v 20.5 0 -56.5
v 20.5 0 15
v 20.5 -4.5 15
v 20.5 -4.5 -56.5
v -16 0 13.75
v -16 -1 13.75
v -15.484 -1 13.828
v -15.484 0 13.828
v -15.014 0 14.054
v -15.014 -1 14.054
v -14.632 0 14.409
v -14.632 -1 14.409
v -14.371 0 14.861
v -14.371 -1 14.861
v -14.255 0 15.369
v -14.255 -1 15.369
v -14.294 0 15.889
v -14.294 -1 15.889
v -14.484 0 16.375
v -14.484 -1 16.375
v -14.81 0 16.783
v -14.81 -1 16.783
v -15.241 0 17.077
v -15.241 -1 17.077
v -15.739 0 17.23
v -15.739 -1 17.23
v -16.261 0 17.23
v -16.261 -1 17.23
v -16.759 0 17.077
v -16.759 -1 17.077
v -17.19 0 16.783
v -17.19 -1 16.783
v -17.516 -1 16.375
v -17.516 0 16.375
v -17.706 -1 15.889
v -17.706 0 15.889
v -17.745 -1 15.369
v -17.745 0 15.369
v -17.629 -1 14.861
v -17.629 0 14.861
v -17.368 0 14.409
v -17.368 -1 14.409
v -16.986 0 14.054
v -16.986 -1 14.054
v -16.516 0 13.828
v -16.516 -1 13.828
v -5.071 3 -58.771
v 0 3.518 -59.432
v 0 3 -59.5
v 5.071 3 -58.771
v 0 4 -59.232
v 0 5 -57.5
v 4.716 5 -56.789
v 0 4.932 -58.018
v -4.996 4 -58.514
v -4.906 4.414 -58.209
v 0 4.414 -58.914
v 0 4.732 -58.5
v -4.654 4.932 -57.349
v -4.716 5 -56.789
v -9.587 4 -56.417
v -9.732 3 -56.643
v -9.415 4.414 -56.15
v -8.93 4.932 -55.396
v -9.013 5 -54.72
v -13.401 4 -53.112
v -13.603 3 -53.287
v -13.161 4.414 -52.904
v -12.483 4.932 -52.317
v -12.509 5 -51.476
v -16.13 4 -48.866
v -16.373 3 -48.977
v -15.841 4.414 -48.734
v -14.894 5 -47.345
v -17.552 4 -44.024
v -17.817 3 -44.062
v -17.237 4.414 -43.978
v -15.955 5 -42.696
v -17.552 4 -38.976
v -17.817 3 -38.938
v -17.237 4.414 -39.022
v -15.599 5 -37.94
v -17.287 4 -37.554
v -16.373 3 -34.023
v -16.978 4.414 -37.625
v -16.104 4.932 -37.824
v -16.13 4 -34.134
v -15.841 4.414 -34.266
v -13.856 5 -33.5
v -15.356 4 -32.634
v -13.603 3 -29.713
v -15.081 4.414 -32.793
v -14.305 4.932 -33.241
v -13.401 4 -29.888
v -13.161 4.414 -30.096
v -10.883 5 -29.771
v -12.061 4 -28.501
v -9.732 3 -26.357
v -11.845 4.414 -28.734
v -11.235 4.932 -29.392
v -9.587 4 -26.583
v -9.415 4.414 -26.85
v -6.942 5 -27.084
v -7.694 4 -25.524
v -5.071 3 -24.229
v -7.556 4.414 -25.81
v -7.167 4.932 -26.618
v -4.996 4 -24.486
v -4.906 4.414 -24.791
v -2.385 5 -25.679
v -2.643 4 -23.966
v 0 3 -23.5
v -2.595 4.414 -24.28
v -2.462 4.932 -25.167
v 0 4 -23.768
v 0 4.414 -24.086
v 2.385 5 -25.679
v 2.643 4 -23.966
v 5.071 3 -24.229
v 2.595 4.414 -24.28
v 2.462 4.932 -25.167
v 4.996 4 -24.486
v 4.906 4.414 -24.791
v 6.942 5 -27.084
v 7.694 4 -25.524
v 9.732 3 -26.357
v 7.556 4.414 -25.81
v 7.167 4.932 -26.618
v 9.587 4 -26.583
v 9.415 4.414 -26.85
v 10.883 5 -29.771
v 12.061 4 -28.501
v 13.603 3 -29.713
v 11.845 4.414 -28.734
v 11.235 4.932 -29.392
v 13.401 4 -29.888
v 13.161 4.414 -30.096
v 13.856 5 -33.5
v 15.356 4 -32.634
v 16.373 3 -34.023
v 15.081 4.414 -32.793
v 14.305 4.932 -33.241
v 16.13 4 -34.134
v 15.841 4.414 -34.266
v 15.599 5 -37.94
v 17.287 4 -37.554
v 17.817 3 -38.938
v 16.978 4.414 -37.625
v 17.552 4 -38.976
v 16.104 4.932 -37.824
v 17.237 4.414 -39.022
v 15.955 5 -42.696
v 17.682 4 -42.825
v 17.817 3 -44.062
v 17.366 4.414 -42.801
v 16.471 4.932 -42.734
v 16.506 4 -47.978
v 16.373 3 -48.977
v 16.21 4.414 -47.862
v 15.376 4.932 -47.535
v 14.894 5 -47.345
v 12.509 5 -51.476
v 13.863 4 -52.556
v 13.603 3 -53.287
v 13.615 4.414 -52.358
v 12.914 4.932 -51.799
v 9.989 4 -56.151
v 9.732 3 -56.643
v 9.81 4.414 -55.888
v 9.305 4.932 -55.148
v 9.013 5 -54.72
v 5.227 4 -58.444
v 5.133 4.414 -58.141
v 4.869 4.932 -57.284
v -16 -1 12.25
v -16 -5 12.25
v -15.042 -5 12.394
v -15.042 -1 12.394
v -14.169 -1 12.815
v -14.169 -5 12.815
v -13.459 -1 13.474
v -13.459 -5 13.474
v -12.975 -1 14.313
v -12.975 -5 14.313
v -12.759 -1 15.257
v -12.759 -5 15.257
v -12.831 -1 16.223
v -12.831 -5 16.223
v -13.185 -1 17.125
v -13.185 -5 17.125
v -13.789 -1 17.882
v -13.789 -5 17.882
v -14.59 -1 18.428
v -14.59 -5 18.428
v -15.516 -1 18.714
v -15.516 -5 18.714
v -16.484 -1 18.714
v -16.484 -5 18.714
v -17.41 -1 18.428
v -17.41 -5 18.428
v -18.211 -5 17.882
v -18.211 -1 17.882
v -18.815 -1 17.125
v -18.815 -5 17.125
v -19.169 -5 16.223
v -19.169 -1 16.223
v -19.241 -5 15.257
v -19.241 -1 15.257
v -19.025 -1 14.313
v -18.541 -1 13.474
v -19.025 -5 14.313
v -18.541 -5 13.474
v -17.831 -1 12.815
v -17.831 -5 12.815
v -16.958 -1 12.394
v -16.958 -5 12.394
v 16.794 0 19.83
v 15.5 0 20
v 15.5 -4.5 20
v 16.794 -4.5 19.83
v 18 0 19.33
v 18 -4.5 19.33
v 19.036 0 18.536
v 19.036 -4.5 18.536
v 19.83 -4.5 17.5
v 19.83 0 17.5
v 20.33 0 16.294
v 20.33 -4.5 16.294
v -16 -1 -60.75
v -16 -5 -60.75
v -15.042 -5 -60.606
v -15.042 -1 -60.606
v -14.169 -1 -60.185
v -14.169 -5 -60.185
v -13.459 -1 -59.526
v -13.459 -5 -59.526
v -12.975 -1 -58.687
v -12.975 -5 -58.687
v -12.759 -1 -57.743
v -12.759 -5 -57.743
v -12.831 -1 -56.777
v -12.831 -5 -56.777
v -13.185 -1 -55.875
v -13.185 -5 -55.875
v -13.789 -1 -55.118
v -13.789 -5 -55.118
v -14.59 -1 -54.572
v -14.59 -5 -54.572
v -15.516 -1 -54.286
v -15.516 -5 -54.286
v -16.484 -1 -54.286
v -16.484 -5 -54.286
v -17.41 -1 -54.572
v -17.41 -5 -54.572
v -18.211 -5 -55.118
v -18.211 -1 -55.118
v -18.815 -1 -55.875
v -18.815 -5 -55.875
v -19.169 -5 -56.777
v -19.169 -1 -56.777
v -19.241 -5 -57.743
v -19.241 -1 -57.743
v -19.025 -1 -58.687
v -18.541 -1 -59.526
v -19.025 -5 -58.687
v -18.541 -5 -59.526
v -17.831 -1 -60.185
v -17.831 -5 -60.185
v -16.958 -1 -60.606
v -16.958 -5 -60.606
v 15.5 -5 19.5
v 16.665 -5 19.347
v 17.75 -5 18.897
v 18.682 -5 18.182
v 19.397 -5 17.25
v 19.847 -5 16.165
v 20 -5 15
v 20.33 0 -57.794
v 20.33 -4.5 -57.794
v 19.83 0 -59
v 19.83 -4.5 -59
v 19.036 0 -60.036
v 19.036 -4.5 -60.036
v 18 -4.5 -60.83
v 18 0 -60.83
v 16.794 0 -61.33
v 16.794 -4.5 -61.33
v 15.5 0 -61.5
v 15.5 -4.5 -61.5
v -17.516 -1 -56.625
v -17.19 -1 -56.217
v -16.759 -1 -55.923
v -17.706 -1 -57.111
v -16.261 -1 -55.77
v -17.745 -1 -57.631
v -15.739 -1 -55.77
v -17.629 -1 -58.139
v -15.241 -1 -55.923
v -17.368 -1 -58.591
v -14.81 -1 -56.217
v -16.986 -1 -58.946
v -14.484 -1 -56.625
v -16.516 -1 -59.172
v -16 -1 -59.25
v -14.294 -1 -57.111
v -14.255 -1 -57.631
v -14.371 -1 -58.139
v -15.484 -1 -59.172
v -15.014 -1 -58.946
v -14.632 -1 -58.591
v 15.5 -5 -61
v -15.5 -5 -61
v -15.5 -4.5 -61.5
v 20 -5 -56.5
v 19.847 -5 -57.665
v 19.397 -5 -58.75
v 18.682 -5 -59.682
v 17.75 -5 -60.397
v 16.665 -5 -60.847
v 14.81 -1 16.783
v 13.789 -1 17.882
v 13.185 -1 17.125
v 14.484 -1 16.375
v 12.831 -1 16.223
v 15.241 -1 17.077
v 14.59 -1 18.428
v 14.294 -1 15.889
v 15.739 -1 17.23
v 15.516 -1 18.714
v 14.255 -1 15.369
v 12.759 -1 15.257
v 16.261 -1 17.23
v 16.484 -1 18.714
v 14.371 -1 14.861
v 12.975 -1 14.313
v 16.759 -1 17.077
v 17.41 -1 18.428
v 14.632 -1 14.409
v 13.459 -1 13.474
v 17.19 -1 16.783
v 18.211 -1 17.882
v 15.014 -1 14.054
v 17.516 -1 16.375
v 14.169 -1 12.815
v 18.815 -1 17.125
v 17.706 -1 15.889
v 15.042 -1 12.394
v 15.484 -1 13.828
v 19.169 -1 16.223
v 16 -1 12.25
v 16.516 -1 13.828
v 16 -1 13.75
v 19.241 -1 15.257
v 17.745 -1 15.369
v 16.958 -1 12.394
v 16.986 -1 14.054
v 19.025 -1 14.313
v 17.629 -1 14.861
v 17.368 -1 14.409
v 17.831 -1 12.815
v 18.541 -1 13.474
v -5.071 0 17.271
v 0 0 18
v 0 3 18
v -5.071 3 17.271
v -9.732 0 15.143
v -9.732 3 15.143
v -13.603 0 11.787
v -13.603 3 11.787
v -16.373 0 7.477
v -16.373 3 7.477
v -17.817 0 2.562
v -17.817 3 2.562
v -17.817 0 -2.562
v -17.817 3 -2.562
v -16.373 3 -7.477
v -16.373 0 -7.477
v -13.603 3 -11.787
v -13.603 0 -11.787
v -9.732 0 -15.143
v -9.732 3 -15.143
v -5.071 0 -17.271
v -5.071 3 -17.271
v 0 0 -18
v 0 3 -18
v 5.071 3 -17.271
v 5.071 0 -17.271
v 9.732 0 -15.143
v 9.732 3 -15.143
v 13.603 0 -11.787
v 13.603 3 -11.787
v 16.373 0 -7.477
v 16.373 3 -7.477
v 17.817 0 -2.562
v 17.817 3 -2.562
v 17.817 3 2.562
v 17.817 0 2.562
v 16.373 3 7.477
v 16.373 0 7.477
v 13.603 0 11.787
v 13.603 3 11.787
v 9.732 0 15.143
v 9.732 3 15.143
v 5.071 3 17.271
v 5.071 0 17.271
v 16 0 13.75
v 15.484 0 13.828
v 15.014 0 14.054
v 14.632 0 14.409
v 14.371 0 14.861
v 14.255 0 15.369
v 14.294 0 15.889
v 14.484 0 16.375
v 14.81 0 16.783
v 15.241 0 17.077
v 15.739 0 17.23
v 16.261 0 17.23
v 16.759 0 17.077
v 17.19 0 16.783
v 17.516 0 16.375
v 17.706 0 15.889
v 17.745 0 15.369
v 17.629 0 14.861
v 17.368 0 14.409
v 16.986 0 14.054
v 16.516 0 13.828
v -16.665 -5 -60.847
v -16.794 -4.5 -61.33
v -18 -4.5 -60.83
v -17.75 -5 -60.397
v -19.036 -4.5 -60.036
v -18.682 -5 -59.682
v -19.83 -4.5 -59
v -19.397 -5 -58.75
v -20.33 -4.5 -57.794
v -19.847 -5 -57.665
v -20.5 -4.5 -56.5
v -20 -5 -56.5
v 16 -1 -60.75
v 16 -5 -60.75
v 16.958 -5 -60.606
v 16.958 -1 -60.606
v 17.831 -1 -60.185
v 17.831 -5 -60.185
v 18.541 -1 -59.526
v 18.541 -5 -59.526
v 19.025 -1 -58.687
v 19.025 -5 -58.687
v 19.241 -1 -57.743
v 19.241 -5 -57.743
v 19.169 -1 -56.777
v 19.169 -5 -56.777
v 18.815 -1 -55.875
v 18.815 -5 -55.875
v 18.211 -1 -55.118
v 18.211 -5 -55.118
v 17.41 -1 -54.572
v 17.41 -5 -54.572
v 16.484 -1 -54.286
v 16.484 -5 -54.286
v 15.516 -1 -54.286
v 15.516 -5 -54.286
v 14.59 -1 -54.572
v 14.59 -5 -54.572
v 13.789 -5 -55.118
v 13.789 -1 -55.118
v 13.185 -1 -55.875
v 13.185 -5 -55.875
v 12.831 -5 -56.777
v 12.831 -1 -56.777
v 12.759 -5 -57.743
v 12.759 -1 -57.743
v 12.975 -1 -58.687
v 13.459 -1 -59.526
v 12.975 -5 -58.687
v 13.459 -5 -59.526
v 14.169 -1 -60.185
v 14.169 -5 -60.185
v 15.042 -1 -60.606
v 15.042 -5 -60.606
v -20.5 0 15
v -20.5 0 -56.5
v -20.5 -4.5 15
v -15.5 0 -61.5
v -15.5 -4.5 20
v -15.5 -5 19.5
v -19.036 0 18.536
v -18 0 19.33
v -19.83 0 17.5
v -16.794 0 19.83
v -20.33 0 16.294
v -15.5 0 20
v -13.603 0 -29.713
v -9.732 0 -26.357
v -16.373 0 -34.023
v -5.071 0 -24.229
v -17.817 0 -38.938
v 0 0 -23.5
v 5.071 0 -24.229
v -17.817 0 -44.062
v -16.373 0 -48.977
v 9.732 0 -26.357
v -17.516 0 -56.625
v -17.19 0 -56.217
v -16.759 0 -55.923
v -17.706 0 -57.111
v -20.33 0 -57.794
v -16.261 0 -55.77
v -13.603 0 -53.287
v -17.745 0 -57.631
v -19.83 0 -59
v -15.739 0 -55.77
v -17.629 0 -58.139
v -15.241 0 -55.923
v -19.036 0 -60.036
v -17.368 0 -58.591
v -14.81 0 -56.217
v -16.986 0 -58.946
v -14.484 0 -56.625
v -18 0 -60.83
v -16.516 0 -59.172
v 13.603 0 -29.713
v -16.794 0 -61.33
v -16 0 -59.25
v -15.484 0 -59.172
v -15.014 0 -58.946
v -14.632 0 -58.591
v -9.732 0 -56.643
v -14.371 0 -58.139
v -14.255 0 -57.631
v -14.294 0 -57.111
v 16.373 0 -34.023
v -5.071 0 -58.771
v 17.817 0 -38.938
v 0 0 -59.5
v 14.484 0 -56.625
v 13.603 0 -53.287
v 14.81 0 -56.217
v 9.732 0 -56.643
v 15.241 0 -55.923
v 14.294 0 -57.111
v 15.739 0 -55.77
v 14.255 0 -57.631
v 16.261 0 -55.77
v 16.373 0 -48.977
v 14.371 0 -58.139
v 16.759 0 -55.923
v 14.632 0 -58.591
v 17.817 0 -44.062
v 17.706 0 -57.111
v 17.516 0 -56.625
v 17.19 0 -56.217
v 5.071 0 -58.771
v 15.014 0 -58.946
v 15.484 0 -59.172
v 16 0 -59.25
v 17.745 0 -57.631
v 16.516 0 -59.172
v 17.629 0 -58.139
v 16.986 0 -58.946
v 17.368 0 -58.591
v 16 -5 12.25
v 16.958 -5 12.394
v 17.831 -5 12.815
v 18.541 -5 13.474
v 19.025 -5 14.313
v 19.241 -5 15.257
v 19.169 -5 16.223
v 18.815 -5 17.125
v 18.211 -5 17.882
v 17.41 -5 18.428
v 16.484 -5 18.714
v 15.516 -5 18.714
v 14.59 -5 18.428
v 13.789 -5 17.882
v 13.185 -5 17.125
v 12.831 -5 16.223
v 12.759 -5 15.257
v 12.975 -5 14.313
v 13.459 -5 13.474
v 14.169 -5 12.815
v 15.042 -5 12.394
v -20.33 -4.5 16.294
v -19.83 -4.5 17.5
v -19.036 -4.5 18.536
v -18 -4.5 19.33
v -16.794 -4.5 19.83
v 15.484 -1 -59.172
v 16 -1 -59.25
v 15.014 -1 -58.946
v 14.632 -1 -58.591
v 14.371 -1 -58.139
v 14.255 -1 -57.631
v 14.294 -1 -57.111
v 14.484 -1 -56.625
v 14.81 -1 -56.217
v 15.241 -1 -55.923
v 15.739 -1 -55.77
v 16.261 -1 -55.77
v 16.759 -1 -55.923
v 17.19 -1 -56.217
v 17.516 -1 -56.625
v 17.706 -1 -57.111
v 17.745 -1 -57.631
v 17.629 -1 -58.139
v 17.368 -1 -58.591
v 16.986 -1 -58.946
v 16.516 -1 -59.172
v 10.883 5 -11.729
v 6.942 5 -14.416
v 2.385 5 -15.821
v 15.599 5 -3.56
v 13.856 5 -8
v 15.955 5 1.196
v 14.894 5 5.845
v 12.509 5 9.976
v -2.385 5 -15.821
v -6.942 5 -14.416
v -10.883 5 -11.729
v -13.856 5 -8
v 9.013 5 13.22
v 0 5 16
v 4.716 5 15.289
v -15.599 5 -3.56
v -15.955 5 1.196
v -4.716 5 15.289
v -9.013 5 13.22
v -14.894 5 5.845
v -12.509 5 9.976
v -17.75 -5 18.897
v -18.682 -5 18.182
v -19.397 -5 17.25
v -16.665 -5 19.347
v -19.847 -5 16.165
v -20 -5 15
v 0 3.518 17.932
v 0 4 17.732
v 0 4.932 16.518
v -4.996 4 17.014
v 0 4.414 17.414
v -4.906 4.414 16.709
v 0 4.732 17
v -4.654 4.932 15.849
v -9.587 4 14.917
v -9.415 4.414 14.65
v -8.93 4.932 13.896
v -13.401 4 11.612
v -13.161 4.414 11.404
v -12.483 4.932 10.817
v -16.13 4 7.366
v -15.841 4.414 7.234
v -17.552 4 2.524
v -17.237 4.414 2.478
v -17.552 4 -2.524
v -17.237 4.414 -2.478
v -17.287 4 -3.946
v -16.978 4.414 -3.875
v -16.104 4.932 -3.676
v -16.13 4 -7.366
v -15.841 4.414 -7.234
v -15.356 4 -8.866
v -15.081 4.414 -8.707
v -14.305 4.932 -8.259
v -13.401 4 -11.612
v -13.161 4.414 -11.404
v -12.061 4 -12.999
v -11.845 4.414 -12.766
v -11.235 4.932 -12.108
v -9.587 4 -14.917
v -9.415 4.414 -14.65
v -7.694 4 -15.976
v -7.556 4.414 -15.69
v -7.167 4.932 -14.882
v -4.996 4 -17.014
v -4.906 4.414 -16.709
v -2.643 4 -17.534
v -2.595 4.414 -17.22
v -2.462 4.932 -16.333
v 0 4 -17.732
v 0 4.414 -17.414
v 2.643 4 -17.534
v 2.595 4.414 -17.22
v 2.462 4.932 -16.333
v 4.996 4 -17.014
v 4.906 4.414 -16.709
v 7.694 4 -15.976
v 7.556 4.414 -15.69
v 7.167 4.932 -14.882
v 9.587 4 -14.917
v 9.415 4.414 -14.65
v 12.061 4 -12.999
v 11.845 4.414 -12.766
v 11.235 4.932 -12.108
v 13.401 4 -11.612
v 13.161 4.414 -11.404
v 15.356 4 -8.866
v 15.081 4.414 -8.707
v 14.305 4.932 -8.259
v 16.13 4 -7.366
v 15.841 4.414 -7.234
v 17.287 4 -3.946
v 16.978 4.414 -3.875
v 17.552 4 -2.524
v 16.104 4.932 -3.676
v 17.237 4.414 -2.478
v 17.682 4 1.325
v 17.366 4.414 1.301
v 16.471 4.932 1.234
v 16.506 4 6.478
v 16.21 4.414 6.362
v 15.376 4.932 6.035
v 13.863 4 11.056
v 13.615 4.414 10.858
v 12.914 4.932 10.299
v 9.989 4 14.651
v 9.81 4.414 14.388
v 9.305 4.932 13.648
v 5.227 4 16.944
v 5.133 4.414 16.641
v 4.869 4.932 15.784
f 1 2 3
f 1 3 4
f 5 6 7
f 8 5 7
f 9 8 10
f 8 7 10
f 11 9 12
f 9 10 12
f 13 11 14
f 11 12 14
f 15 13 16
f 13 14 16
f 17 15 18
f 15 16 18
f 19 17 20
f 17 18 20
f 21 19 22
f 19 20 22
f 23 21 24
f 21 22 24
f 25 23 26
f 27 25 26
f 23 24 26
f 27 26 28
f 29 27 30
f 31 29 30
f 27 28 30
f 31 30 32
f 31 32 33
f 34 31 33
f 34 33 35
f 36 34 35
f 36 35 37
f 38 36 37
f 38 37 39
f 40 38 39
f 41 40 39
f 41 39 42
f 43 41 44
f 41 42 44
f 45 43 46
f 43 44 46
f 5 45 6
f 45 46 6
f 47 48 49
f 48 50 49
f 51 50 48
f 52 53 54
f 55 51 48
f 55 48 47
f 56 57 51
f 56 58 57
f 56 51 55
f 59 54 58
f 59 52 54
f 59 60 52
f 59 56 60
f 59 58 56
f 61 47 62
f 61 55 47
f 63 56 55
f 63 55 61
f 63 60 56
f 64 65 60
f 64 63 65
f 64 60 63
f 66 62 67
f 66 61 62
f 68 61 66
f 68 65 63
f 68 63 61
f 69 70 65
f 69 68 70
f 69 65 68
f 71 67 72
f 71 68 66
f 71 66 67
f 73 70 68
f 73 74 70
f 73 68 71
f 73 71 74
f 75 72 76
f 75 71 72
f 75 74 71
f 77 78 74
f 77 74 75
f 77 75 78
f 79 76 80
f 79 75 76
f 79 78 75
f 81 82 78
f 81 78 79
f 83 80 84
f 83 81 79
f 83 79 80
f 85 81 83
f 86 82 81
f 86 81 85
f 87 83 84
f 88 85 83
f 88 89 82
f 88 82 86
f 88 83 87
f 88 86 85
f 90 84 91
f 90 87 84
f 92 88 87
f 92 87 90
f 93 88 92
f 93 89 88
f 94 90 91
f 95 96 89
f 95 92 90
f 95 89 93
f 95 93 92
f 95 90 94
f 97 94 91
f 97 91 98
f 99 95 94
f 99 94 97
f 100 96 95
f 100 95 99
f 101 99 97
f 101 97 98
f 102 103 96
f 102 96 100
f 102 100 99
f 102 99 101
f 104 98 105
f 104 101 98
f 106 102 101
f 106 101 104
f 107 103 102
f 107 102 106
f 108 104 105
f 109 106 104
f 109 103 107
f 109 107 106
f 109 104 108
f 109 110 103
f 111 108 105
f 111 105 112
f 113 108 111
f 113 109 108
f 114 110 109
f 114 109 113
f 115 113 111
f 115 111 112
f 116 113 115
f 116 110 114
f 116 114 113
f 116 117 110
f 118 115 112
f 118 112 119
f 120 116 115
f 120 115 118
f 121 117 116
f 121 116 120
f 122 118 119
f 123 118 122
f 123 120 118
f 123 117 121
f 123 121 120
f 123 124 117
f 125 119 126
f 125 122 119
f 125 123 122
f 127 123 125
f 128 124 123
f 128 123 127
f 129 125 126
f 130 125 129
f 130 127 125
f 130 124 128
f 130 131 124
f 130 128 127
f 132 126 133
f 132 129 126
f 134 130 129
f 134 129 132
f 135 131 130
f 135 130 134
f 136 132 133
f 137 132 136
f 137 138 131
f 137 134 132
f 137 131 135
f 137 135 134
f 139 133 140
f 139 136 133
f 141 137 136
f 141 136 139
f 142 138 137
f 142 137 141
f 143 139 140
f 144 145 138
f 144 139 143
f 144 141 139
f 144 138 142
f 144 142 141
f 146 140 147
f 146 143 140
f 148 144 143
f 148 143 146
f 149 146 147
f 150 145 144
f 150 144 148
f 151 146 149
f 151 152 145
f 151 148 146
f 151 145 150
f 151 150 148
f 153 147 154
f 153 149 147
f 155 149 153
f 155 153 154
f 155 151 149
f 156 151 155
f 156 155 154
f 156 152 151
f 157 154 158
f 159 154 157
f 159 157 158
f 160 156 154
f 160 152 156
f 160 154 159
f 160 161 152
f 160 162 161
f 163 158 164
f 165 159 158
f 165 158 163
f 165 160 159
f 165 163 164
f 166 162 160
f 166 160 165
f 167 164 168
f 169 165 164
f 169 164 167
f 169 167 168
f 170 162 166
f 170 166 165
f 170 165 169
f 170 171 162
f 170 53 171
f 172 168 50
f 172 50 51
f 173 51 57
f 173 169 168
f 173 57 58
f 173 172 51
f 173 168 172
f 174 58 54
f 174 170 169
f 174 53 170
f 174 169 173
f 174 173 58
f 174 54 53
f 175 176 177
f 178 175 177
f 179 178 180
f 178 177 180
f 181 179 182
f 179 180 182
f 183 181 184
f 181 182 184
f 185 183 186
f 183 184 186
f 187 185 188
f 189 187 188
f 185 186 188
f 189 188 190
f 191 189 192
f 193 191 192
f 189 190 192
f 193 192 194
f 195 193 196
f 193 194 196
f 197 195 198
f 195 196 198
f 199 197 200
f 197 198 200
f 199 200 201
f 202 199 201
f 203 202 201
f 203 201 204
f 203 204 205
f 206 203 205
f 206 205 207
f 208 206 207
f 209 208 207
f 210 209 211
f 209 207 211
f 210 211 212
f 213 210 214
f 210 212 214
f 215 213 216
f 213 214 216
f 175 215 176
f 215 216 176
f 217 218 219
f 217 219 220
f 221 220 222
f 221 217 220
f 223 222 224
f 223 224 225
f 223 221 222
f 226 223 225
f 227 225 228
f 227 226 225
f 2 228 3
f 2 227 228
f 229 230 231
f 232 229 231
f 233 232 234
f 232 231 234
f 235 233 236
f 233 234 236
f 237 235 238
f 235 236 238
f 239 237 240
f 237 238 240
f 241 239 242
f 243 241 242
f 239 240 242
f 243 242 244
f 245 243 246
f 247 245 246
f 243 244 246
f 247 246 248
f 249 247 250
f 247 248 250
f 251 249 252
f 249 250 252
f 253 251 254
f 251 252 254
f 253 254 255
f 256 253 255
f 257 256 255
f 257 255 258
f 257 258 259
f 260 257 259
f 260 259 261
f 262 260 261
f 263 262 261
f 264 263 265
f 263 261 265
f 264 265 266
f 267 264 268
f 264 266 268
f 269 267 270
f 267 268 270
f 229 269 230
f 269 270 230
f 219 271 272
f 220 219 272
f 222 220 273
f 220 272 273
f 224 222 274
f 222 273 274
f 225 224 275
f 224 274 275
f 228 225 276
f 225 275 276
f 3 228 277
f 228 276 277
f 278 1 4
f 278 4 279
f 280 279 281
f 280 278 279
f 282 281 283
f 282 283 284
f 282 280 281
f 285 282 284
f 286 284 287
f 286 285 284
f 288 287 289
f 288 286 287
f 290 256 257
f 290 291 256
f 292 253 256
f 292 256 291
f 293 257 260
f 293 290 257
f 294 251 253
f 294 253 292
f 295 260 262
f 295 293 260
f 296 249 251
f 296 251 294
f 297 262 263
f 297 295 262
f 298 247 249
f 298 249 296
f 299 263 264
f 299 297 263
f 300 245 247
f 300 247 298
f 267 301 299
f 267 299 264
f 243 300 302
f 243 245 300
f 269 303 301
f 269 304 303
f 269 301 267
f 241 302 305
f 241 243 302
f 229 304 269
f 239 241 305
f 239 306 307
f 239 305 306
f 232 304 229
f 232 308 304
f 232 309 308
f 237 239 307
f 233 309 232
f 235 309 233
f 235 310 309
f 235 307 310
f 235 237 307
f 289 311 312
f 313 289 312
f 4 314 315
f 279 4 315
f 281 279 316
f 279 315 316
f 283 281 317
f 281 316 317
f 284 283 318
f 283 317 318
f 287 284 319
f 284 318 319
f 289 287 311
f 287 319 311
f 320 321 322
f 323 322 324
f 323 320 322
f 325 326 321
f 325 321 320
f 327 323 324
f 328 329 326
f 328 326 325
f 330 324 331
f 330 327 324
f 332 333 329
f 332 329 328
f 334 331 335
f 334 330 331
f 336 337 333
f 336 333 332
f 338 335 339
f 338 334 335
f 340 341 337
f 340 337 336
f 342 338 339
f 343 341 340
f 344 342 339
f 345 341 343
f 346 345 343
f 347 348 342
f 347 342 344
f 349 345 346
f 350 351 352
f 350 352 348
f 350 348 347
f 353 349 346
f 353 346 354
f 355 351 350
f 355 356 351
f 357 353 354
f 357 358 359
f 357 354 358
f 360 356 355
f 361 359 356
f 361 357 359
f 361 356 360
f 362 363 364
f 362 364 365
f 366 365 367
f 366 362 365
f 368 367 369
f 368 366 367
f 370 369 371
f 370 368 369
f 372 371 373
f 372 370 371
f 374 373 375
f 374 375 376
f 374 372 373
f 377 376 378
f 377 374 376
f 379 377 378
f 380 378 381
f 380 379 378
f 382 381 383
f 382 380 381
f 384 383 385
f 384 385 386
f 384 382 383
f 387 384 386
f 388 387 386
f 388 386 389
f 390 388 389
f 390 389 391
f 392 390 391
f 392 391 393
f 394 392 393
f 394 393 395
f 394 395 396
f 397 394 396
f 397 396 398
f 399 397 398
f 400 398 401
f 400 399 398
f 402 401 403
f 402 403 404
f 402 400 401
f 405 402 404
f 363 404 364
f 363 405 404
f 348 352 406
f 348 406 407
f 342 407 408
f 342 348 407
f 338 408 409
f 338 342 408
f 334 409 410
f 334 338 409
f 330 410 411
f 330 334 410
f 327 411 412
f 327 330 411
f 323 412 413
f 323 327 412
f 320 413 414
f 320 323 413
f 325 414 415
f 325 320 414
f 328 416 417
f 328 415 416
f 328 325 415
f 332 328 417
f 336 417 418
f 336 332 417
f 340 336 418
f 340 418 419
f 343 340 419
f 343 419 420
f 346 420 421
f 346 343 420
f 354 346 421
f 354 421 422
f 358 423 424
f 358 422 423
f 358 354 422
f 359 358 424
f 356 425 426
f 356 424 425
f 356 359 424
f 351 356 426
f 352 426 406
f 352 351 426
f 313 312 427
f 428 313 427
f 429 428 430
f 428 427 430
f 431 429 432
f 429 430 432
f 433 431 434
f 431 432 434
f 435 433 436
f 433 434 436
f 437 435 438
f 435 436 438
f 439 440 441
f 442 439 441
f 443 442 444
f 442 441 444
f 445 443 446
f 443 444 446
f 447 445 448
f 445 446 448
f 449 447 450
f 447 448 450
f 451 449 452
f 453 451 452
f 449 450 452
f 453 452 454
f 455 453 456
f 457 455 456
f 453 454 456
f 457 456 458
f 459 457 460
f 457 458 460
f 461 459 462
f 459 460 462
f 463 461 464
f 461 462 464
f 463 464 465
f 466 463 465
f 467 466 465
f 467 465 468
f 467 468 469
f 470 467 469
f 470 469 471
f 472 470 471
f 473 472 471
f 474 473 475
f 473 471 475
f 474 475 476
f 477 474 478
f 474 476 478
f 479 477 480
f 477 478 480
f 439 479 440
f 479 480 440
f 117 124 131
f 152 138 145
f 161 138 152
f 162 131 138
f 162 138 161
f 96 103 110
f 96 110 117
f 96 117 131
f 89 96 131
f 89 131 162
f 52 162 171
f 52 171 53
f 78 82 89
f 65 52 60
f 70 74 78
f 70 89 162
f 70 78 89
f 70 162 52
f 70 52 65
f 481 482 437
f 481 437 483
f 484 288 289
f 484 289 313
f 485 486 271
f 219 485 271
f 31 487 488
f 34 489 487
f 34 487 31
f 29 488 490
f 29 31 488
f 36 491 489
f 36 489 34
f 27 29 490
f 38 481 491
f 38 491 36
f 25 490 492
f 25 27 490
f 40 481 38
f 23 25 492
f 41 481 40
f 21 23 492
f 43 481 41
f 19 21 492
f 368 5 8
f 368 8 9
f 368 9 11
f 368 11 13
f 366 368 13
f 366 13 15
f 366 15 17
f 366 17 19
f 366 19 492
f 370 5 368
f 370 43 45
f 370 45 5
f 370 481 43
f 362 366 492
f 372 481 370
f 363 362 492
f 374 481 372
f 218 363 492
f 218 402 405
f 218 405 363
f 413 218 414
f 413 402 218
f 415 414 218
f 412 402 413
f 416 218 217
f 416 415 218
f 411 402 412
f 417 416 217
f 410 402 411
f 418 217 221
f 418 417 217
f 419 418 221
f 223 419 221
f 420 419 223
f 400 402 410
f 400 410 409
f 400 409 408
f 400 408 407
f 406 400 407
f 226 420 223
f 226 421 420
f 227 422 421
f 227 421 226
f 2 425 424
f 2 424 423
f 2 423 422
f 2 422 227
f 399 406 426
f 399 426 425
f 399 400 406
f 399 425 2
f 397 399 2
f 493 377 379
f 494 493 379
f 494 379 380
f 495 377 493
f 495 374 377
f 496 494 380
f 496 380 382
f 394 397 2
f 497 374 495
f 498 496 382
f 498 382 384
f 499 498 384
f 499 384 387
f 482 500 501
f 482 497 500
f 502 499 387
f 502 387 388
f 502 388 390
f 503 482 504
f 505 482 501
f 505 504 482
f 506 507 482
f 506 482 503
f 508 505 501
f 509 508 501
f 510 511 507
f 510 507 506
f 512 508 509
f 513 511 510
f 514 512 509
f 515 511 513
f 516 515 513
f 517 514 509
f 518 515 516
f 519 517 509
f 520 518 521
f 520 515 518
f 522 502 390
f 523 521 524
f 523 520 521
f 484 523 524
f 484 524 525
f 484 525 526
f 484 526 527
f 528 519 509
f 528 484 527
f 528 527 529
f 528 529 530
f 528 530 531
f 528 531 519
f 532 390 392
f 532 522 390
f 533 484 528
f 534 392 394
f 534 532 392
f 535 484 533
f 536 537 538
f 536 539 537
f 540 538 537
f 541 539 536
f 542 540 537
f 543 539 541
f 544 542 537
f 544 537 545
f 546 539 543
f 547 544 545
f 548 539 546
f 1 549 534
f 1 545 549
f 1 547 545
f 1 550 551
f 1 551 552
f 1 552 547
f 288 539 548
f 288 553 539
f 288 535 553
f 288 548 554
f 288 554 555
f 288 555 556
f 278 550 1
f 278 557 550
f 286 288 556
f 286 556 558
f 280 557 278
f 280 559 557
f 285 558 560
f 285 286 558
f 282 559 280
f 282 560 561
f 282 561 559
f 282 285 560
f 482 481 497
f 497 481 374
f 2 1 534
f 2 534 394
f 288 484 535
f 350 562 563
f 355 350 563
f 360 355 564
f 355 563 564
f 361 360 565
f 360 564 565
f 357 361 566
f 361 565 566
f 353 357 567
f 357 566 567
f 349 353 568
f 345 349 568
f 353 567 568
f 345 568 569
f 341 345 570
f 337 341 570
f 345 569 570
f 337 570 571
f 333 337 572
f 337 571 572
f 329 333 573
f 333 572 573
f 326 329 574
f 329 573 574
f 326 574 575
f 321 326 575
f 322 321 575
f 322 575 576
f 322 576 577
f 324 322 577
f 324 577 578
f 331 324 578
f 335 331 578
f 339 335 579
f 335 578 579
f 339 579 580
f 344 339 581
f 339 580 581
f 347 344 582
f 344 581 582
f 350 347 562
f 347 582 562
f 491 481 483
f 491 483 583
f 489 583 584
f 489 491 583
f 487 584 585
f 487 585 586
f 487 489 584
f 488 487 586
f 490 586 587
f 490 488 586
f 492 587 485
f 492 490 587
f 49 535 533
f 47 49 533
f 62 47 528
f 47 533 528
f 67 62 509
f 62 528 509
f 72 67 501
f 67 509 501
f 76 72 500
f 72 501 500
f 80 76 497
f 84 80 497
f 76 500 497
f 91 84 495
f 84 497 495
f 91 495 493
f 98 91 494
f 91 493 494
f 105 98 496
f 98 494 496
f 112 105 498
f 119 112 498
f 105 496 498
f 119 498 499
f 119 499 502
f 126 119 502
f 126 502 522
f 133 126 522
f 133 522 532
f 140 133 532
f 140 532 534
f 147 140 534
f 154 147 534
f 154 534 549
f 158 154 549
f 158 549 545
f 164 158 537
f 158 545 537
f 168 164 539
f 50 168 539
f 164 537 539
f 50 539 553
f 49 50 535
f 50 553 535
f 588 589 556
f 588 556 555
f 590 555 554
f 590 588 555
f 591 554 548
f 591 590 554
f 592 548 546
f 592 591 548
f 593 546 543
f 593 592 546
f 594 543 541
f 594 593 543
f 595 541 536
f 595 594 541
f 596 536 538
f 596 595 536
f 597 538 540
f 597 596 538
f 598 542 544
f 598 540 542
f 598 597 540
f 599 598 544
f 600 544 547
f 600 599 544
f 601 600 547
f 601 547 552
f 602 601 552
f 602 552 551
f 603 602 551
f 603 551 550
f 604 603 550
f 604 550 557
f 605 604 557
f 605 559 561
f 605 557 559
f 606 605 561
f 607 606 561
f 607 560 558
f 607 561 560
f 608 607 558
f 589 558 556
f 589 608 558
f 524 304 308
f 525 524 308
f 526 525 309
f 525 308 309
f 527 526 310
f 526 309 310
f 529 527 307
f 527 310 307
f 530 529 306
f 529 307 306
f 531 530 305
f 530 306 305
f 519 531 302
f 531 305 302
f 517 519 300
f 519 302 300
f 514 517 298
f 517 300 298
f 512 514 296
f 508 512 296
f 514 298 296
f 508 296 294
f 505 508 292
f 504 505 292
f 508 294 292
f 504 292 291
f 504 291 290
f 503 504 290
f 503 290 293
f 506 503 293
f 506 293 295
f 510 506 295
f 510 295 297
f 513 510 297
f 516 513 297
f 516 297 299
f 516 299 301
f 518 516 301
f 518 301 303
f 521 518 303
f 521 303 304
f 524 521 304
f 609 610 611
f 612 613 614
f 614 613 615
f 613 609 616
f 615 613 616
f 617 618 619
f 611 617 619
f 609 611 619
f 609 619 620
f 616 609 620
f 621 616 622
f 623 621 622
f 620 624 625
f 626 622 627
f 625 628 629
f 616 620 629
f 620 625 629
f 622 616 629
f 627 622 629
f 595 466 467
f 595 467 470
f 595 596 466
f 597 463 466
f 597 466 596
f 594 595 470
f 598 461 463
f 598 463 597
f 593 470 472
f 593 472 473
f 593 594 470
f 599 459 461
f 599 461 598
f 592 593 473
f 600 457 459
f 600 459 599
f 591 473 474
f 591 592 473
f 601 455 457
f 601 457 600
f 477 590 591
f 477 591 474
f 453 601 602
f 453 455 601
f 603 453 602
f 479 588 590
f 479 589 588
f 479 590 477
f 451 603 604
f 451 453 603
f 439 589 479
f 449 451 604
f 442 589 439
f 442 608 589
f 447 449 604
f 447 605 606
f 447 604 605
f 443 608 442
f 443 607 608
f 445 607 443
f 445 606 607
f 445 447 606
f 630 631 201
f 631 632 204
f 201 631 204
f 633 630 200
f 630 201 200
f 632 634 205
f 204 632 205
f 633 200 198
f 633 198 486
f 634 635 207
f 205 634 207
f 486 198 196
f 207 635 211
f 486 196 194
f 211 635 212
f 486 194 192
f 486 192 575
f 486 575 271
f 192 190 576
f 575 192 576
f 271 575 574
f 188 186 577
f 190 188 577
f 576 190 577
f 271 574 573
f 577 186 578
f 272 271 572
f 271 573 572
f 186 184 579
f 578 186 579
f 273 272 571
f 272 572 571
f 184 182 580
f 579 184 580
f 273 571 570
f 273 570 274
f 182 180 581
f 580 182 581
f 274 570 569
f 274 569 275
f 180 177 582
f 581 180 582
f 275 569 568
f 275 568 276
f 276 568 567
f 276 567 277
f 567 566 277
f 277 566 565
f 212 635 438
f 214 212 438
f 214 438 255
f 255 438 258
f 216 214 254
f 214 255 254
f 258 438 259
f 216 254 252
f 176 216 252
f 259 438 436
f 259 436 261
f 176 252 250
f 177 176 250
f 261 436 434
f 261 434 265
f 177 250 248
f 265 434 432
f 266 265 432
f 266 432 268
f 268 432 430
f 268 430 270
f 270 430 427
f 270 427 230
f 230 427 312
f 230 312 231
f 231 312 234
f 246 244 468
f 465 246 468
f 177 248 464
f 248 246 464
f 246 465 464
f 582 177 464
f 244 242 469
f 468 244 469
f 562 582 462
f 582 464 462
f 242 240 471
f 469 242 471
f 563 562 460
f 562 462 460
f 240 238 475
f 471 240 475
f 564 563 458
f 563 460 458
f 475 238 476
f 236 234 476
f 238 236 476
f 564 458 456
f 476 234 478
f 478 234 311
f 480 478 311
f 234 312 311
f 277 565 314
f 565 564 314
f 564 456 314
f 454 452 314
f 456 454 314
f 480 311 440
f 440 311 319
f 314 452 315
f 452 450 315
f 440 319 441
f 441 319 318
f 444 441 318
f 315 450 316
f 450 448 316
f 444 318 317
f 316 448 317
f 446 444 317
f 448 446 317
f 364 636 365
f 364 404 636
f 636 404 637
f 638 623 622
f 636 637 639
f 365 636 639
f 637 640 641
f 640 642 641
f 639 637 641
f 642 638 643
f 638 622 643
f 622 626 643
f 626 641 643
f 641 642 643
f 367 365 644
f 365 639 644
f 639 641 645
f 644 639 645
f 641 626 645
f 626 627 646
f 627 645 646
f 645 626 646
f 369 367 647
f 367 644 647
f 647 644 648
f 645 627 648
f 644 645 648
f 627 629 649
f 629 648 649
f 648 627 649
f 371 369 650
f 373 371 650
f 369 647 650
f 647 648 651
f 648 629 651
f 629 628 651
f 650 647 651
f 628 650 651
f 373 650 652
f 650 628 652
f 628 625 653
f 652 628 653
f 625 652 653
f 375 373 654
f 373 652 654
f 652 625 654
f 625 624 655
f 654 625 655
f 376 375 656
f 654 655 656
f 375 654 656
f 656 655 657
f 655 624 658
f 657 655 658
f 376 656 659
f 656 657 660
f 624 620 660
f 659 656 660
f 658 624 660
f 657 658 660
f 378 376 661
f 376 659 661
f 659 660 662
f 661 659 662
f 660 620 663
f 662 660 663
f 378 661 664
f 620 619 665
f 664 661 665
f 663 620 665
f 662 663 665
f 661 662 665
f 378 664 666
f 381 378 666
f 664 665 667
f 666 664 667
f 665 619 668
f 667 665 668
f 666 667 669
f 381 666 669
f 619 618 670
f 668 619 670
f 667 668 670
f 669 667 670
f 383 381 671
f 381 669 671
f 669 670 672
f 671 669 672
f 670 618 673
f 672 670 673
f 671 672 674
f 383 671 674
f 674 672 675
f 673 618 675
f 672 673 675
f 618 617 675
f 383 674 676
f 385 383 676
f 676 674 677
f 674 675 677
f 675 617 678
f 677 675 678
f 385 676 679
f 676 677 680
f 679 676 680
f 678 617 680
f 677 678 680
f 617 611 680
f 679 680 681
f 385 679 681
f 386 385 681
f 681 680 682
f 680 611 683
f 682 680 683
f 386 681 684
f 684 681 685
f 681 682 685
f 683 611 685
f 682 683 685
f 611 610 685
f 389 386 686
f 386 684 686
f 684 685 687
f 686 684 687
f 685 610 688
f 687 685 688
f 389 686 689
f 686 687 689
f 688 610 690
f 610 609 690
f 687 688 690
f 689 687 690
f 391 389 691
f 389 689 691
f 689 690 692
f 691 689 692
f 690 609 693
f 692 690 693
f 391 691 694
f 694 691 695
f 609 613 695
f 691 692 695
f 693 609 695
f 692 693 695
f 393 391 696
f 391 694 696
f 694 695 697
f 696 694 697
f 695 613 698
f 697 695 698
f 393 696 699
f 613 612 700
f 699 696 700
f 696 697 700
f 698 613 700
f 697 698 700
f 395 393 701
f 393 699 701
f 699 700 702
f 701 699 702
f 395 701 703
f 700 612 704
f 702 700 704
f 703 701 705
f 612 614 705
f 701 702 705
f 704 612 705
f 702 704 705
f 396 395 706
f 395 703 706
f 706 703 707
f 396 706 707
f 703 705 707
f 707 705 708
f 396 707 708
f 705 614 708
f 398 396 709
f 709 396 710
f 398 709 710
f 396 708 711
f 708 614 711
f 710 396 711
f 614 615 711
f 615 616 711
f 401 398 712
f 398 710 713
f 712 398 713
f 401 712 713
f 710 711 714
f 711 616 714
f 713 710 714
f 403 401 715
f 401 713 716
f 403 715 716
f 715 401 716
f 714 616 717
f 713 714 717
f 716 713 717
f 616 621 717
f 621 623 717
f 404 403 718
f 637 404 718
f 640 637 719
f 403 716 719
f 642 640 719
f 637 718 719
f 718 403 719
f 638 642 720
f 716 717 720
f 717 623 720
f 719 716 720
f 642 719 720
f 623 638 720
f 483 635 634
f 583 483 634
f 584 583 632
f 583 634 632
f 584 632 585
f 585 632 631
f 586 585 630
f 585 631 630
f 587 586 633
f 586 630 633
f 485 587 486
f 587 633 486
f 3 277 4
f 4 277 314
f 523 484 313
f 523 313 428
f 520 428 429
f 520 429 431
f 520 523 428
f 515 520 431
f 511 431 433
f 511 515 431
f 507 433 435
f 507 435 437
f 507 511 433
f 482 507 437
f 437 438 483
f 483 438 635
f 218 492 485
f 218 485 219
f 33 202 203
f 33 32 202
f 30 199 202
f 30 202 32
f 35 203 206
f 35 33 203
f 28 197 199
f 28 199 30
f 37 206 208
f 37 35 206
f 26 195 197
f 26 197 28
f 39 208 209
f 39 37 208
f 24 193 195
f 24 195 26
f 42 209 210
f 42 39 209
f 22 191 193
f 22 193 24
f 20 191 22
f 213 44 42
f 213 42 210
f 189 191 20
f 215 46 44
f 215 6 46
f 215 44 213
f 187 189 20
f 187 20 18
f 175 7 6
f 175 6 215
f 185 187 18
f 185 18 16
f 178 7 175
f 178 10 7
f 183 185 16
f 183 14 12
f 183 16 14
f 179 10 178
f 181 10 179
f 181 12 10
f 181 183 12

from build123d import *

# Parameters (mm, degrees)
BOSS_EXTRUDE1_DEPTH  = 5
SKETCH2_R            = 1.75
CUT_EXTRUDE1_DEPTH   = 66.019227925
SKETCH5_R            = 18
BOSS_EXTRUDE2_DEPTH  = 5
FILLET1_R            = 2
FILLET1_OF_MIRROR3_R = 2
SKETCH6_R            = 3.25
CUT_EXTRUDE3_DEPTH   = 4
CHAMFER1_SIZE        = 0.5


with BuildPart() as part:
    # Sketch1 → Boss-Extrude1 (new body)
    with BuildSketch(Plane(origin=(0, 0, 0), x_dir=(1, 0, 0), z_dir=(0, 1, 0))):
        with BuildLine():
            Line((-20.5, 56.5), (-20.5, -15))
            ThreePointArc((-20.5, -15), (-19.035533906, -18.535533906), (-15.5, -20))
            Line((-15.5, -20), (15.5, -20))
            ThreePointArc((15.5, -20), (19.035533906, -18.535533906), (20.5, -15))
            Line((20.5, -15), (20.5, 56.5))
            ThreePointArc((20.5, 56.5), (19.035533906, 60.035533906), (15.5, 61.5))
            Line((15.5, 61.5), (-15.5, 61.5))
            ThreePointArc((-15.5, 61.5), (-19.035533906, 60.035533906), (-20.5, 56.5))
        make_face()
    extrude(amount=-BOSS_EXTRUDE1_DEPTH)

    # Sketch2 → Cut-Extrude1 (cut, symmetric)
    with BuildSketch(Plane.XZ.offset(5)):
        with Locations(Location((-16, -57.5, 0), (0, 0, 270))):
            Circle(SKETCH2_R)
        with Locations(Location((-16, 15.5, 0), (0, 0, 270))):
            Circle(SKETCH2_R)
    cut_extrude1 = extrude(amount=CUT_EXTRUDE1_DEPTH, both=True, mode=Mode.SUBTRACT)

    # Mirror1: Cut-Extrude1 across plane
    add(cut_extrude1.mirror(Plane(origin=(0, 0, 0), x_dir=(0, 0, 1), z_dir=(1, 0, 0))), mode=Mode.SUBTRACT)

    # Sketch5 → Boss-Extrude2 (add)
    with BuildSketch(Plane(origin=(0, 0, 0), x_dir=(1, 0, 0), z_dir=(0, 1, 0))):
        with Locations(Location((0, 41.5, 0), (0, 0, 90))):
            Circle(SKETCH5_R)
    boss_extrude2 = extrude(amount=BOSS_EXTRUDE2_DEPTH)

    # Fillet1
    fillet1_edges = [part.edges().sort_by_distance(p)[0] for p in [
        (0, 5, -23.5),
    ]]
    fillet(fillet1_edges, radius=FILLET1_R)

    # Mirror3: Boss-Extrude2 across plane
    add(boss_extrude2.mirror(Plane(origin=(0, 0, -20.75), x_dir=(1, 0, 0), z_dir=(0, 0, -1))))

    # Fillet1 of Mirror3
    fillet1_of_mirror3_edges = [part.edges().sort_by_distance(p)[0] for p in [
        (0, 5, -18),
    ]]
    fillet(fillet1_of_mirror3_edges, radius=FILLET1_OF_MIRROR3_R)

    # Sketch6 → Cut-Extrude3 (cut)
    with BuildSketch(Plane.XZ.offset(5)):
        with Locations(Location((-16, -57.5, 0), (0, 0, 270))):
            Circle(SKETCH6_R)
        with Locations(Location((16, 15.5, 0), (0, 0, 270))):
            Circle(SKETCH6_R)
        with Locations(Location((-16, 15.5, 0), (0, 0, 270))):
            Circle(SKETCH6_R)
        with Locations(Location((16, -57.5, 0), (0, 0, 270))):
            Circle(SKETCH6_R)
    extrude(amount=-CUT_EXTRUDE3_DEPTH, mode=Mode.SUBTRACT)

    # Chamfer1
    chamfer1_edges = [part.edges().sort_by_distance(p)[0] for p in [
        (-19.035533906, -5, 18.535533906),
        (0, -5, 20),
        (19.035533906, -5, 18.535533906),
        (20.5, -5, -20.75),
        (19.035533906, -5, -60.035533906),
        (0, -5, -61.5),
        (-19.035533906, -5, -60.035533906),
        (-20.5, -5, -20.75),
    ]]
    chamfer(chamfer1_edges, length=CHAMFER1_SIZE)


solid = part.part
